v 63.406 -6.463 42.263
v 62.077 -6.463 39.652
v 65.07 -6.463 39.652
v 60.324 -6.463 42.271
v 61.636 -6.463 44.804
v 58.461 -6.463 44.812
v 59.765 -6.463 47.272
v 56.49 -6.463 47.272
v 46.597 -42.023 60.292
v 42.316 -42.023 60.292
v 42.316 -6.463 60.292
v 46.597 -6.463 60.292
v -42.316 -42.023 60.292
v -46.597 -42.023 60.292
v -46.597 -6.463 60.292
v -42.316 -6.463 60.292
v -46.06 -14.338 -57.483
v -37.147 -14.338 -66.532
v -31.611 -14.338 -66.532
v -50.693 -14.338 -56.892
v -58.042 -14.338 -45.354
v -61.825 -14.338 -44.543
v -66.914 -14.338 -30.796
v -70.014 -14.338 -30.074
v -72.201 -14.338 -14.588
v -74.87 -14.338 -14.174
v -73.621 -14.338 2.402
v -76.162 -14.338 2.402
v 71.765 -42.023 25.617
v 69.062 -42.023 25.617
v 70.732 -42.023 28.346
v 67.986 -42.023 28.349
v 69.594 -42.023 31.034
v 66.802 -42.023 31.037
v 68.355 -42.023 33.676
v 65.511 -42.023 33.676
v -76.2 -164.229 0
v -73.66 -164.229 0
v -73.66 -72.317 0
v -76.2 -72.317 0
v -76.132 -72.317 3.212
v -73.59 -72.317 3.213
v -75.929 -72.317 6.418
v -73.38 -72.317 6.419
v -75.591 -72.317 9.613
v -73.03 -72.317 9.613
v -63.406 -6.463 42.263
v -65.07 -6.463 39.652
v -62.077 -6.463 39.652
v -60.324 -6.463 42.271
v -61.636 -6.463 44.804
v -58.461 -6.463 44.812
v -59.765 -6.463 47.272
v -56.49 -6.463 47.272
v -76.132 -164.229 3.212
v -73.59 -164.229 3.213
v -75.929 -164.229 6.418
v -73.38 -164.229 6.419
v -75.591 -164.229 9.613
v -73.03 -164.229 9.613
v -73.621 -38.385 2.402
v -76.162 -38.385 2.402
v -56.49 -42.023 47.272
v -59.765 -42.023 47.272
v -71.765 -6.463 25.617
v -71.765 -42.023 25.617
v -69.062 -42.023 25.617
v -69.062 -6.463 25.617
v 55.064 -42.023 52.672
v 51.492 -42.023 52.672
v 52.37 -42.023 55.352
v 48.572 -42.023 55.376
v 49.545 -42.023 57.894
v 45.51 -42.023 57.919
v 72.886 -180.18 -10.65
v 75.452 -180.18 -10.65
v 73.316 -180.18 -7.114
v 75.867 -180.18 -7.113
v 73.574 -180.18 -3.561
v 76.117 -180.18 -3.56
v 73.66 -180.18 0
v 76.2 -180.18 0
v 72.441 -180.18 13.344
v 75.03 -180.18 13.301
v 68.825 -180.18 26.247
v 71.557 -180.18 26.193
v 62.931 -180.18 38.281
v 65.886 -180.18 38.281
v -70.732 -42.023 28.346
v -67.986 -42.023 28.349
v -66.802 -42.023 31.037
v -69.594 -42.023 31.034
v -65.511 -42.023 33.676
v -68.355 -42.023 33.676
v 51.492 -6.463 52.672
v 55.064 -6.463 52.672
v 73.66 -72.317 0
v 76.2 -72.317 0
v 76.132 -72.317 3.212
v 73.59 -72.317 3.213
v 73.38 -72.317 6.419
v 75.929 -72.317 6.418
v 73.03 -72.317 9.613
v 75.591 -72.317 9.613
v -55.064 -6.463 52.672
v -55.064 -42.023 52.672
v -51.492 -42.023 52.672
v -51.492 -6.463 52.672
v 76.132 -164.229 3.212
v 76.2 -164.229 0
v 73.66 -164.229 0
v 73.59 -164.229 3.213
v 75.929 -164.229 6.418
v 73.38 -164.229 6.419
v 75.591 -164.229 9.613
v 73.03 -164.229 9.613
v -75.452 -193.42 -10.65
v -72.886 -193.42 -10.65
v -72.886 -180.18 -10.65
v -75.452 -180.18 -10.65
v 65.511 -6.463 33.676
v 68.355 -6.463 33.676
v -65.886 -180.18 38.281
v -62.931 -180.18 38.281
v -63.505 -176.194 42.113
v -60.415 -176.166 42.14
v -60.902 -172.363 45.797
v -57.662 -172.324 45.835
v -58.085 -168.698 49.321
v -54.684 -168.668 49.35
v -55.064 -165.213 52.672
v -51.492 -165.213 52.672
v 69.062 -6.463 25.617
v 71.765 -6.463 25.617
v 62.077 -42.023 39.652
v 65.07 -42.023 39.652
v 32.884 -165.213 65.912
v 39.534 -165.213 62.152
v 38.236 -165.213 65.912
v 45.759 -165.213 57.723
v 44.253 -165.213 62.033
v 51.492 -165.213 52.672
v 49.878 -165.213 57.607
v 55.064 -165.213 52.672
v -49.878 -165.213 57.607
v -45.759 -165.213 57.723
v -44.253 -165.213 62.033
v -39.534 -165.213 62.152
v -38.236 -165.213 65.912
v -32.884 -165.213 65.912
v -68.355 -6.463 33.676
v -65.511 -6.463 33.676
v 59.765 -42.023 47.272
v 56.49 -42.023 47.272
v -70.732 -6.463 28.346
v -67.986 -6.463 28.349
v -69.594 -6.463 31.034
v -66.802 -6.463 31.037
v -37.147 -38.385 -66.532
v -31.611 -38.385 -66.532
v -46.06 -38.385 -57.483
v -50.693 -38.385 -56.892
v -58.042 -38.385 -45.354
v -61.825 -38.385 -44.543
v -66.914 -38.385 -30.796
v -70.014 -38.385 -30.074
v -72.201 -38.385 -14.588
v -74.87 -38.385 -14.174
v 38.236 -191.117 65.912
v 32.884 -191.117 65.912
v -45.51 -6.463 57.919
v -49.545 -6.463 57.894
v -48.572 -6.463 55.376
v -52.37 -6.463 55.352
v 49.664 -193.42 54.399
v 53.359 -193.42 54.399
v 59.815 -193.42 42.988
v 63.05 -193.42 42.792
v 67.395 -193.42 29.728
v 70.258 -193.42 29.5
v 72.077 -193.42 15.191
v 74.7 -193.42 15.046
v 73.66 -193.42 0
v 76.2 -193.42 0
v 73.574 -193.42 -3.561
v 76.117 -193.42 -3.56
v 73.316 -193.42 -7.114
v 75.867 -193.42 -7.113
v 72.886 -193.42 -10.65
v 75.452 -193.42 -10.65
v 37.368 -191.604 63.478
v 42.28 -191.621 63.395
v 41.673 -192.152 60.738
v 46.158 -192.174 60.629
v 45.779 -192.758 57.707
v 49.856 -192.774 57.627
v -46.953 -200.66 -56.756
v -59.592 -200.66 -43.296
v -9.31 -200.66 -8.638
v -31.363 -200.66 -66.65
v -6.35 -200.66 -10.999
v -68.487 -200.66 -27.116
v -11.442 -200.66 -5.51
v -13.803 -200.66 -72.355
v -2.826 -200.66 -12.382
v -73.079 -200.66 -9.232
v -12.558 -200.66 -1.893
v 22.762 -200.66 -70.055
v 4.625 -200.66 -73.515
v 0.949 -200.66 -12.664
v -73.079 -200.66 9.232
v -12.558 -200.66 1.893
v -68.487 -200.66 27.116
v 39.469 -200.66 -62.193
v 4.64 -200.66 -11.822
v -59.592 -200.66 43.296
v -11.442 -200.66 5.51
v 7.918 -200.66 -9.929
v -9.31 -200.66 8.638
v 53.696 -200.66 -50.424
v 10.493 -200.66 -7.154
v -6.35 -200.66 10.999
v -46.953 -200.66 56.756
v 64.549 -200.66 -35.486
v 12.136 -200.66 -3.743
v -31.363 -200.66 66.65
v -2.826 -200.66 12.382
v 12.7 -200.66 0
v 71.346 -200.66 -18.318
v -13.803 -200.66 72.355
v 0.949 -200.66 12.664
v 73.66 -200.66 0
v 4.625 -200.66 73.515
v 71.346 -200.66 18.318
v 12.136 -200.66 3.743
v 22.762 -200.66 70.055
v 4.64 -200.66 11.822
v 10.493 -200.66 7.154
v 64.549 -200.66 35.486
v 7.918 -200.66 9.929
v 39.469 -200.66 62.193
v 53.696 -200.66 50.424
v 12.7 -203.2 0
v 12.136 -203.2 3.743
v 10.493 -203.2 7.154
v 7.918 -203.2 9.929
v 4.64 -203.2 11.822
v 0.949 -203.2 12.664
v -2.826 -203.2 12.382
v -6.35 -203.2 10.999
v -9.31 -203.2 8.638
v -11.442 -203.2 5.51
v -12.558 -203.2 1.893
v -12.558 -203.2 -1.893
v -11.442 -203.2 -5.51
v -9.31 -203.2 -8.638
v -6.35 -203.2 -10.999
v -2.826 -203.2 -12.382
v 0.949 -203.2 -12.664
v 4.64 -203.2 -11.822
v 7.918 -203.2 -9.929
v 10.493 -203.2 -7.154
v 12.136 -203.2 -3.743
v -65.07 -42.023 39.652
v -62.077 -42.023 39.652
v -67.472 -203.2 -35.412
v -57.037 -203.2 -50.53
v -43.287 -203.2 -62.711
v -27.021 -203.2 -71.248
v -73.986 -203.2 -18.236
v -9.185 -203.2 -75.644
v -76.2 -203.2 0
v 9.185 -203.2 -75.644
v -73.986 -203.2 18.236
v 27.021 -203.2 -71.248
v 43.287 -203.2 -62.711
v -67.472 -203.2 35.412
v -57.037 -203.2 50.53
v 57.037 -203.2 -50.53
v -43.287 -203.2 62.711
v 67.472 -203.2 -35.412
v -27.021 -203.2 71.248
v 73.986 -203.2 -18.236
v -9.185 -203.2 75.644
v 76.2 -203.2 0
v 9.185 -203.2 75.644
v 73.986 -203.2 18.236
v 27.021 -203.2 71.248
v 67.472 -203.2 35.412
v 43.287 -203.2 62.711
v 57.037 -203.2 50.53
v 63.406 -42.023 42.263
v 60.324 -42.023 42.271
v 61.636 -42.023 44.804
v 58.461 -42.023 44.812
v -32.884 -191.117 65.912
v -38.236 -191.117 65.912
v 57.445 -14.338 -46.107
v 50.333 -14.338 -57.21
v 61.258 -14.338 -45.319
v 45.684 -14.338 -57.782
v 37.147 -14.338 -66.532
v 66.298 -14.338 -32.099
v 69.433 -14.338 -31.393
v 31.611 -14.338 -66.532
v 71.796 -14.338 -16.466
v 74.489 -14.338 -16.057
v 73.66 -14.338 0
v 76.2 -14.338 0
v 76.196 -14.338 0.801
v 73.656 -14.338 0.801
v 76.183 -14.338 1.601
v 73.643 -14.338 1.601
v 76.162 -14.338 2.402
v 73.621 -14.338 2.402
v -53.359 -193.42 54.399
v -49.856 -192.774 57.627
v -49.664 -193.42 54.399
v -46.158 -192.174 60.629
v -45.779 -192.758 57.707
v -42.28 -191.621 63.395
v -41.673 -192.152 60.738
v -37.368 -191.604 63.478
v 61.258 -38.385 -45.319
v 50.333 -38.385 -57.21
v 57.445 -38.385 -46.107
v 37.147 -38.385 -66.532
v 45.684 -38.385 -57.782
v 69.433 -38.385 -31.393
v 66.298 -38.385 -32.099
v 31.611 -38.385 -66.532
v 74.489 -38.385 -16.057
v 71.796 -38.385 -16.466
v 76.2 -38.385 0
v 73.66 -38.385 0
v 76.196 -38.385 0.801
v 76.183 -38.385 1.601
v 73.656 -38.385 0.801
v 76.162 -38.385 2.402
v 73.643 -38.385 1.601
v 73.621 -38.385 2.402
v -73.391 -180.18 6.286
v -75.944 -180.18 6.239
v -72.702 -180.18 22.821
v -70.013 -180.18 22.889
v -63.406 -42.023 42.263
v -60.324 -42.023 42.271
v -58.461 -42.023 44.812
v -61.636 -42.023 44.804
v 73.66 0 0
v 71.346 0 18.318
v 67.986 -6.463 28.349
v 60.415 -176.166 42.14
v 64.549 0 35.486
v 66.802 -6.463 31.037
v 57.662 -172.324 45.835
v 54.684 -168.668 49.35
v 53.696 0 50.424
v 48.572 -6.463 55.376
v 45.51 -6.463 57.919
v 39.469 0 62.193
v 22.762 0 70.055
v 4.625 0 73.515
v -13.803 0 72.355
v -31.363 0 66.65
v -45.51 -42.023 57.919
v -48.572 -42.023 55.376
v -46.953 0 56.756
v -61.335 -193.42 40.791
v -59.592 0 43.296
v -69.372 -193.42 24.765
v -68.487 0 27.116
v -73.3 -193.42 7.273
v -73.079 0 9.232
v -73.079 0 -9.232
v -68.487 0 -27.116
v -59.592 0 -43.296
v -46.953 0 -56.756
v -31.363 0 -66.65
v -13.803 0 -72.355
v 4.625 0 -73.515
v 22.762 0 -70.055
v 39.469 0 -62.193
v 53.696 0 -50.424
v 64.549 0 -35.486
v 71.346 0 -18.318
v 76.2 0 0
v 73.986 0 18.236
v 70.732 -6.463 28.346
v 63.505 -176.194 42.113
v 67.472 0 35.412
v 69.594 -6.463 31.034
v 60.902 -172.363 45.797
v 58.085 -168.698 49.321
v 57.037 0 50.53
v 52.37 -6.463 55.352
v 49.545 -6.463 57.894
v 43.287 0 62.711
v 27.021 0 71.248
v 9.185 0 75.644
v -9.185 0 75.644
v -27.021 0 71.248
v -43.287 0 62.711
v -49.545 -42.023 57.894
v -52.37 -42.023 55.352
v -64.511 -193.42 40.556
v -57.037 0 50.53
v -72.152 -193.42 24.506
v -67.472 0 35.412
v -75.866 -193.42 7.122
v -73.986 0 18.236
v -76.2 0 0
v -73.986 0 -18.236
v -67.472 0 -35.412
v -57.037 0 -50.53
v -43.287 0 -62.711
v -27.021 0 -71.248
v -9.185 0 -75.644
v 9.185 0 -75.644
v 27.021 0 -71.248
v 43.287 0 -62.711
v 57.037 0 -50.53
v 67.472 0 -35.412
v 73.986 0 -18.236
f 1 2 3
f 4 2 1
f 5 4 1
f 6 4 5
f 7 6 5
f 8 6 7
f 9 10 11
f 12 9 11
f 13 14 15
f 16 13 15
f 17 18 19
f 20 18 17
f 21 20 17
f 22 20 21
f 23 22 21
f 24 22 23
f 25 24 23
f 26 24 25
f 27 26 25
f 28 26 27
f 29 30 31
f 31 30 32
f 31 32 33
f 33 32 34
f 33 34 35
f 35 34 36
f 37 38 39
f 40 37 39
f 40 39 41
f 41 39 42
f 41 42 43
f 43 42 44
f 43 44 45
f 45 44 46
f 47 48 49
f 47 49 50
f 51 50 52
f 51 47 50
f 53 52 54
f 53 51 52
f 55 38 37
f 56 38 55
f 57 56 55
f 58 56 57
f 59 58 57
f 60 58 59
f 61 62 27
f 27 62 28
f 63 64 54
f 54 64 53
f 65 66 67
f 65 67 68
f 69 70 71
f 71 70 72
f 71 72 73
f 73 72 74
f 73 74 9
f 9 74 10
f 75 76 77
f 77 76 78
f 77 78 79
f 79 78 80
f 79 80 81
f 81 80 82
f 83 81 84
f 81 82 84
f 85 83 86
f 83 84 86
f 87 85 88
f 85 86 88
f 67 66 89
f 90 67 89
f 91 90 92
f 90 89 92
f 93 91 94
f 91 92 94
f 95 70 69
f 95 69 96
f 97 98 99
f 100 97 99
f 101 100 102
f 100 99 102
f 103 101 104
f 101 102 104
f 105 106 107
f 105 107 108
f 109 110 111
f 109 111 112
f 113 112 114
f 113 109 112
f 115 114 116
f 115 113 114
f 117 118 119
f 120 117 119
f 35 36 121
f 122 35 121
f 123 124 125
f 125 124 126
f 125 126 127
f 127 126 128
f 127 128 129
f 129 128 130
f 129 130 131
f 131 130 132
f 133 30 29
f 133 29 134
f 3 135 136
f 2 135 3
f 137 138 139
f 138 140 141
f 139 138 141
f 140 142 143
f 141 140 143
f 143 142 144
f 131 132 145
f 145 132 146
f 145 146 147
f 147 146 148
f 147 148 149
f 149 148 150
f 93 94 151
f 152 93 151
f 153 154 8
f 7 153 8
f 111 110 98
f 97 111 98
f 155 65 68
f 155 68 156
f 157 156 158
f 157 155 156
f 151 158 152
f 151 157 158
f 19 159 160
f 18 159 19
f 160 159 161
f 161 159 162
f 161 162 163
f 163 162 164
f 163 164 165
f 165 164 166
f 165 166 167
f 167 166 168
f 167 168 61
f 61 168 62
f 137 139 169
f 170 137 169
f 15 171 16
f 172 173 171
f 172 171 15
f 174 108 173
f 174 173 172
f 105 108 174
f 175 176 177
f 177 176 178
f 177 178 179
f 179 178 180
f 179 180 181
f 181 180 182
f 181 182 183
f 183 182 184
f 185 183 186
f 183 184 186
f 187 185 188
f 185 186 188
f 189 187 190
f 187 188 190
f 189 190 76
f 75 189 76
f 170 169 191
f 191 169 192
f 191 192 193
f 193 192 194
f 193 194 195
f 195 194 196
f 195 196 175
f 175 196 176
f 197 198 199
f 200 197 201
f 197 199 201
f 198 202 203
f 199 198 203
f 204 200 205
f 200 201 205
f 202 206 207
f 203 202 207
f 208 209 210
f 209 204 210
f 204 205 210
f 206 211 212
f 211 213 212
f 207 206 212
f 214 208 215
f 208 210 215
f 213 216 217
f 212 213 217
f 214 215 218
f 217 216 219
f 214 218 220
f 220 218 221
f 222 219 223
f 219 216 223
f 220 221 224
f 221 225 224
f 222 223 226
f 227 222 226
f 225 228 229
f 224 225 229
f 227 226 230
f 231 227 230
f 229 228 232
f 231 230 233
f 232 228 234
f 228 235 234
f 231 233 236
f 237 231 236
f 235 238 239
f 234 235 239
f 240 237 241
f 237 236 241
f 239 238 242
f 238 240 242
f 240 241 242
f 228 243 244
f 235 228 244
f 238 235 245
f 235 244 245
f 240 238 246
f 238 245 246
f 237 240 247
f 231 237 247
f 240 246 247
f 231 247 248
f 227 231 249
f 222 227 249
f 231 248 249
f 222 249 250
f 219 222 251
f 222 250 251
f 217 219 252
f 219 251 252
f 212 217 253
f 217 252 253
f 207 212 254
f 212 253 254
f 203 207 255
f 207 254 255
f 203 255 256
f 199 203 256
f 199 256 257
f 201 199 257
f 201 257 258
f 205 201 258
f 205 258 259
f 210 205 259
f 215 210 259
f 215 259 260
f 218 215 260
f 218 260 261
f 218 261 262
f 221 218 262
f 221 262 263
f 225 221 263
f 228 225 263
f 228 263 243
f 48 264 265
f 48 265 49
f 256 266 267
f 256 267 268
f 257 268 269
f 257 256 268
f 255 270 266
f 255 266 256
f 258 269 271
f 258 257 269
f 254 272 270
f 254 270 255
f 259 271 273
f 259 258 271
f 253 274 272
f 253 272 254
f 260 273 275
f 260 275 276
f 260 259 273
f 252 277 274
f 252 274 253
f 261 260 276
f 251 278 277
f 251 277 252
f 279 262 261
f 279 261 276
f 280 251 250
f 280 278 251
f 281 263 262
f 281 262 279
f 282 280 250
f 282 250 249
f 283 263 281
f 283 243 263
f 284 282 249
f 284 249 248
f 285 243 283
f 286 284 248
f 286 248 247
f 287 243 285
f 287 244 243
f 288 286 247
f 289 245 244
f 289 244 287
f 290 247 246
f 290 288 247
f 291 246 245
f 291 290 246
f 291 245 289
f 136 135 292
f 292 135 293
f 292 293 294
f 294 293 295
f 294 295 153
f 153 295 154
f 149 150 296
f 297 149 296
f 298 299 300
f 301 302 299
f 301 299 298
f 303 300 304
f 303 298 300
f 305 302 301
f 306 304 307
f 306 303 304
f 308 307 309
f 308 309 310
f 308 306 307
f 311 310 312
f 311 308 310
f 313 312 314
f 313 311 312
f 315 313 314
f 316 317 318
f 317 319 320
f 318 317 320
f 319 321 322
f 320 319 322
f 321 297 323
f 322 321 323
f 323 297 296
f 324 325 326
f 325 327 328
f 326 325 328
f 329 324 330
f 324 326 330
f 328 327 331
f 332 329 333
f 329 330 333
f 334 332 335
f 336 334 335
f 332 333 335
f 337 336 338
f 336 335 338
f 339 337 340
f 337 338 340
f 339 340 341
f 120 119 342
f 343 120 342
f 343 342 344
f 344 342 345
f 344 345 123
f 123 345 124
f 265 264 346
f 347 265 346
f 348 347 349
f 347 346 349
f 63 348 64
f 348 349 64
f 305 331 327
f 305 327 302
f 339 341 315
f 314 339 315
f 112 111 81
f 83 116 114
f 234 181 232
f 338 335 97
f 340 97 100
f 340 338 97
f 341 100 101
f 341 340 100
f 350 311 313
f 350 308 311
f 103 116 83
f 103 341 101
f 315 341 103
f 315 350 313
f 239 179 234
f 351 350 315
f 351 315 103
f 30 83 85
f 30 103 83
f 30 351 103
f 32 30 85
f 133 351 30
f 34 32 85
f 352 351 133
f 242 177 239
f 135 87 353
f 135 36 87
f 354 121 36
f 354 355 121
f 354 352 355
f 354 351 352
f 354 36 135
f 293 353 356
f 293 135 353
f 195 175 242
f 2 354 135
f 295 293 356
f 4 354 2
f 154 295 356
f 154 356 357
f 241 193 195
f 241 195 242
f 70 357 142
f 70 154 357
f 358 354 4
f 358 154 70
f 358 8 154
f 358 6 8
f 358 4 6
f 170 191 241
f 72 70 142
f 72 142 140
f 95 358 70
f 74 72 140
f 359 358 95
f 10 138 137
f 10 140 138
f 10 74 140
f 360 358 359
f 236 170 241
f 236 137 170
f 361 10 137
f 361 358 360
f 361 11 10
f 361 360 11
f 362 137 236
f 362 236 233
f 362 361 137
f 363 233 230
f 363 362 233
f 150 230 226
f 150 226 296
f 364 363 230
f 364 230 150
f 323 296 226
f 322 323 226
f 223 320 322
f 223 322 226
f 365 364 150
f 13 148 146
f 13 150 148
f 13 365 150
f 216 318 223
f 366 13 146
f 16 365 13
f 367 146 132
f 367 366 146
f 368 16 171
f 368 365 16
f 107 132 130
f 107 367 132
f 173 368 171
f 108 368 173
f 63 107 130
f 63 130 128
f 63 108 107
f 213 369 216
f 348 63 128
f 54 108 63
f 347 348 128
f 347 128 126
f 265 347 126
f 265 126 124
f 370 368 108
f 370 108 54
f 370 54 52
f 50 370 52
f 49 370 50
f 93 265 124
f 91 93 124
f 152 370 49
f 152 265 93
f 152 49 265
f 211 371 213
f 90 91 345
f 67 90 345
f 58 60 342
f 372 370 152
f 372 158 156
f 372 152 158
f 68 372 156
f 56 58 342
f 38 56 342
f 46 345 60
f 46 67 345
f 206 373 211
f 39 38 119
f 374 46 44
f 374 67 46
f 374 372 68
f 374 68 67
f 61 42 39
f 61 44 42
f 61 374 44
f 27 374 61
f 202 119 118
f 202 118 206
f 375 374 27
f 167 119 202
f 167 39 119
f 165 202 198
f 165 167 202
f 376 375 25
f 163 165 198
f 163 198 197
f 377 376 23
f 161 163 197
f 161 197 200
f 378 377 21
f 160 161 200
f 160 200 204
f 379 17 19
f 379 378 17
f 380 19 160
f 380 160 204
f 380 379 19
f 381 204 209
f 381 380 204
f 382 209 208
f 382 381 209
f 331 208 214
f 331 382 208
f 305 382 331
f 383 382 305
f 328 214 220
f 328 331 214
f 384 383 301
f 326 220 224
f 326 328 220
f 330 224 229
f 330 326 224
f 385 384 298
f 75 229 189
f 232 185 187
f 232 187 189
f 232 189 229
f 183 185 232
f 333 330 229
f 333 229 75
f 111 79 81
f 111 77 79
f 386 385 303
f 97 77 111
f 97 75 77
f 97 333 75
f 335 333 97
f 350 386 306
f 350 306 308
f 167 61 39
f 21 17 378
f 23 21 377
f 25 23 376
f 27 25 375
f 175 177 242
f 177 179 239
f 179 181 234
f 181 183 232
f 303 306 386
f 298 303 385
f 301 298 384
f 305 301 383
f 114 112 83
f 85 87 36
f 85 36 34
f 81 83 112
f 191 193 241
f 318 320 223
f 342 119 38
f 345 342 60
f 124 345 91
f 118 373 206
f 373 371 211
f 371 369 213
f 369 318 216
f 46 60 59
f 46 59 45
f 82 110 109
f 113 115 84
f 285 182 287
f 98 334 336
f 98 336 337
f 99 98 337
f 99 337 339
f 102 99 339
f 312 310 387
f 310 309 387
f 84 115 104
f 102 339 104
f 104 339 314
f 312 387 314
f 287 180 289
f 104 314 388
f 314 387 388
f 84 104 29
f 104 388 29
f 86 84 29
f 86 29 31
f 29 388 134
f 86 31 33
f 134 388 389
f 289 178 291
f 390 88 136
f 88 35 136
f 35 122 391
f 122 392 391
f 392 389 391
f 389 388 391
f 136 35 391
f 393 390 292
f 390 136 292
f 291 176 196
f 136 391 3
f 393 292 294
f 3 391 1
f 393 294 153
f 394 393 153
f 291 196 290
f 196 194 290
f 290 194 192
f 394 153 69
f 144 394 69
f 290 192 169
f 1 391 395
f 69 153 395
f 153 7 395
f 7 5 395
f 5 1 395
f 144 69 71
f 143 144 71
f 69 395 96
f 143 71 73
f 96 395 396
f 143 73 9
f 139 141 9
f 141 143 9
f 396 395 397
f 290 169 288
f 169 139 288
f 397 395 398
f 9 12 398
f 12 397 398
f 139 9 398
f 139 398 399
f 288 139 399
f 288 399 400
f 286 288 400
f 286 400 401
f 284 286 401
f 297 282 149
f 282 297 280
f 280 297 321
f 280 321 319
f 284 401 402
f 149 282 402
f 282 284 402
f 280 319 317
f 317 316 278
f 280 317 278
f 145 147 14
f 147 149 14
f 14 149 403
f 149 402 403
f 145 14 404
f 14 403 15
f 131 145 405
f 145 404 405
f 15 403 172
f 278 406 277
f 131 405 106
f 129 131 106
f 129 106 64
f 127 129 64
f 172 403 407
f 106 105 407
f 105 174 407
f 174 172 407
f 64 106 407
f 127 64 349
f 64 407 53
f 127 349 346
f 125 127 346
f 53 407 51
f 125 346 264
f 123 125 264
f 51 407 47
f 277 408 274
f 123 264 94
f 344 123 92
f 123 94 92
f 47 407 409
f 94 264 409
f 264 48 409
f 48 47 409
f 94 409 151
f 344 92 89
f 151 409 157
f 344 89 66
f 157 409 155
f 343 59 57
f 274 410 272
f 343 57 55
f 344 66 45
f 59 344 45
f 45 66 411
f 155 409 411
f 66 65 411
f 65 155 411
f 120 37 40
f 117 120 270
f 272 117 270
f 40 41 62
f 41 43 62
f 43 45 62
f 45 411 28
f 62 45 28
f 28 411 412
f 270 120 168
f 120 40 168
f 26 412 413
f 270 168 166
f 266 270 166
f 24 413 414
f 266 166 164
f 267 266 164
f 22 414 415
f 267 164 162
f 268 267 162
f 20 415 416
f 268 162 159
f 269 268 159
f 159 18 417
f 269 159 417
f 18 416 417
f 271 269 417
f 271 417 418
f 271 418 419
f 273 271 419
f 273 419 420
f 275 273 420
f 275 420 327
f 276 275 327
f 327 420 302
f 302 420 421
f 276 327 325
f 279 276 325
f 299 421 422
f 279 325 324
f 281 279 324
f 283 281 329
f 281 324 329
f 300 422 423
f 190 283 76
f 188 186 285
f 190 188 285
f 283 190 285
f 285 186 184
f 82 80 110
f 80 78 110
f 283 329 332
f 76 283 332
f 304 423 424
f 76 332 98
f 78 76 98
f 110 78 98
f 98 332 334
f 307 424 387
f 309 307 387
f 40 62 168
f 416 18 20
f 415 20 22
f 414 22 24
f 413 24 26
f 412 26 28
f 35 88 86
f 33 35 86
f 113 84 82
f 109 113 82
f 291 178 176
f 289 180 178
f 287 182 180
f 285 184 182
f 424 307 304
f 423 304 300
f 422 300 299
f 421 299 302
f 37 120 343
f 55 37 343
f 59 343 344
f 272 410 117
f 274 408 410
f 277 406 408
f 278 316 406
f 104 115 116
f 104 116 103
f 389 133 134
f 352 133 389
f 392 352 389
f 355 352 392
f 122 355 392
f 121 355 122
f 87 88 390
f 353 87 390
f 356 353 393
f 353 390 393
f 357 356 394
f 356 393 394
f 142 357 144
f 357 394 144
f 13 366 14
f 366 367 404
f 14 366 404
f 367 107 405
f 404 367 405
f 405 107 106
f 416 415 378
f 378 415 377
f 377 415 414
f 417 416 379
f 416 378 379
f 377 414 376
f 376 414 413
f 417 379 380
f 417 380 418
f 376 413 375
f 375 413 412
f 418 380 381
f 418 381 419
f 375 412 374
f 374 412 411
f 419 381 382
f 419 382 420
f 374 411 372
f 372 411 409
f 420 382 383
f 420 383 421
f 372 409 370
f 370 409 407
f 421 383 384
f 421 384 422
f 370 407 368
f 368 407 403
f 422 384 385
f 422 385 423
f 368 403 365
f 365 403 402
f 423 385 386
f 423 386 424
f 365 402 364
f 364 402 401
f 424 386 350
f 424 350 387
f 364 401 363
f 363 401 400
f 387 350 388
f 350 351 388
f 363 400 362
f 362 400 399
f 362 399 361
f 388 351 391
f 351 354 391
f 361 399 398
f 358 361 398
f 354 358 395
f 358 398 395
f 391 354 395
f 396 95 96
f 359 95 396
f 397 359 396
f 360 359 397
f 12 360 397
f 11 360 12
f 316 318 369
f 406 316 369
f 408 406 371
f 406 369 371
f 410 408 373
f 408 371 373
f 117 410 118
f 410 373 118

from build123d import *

# Parameters (mm, degrees)
F0_R      = 76.2
F1_DEPTH  = 203.2
F2_R      = 12.7
F3_DEPTH  = 38.1
F4_T      = -2.54
F5_W      = 35.56
F5_H      = 7.62
F5_H_2    = 8.0591589212
F6_DEPTH  = 88.9
F7_R      = 12.7
F8_DEPTH  = 241.301
F9_W      = 24.0467190742
F9_H      = 68.9339339733
F9_W_2    = 91.9119119644
F9_H_2    = 9.6131237224
F10_DEPTH = 127


with BuildPart() as f1:
    # F0 (on Front) → F1 (new body)
    with BuildSketch(Plane.XZ):
        Circle(F0_R)
    extrude(amount=F1_DEPTH)

    # F2 (on face) → F3 (join)
    with BuildSketch(Plane.XZ.offset(203.2)):
        Circle(F2_R)
    extrude(amount=F3_DEPTH)

    # F4
    f4_openings = [f1.faces().sort_by_distance(p)[0] for p in [
        (0, 0, 0),
    ]]
    offset(amount=F4_T, openings=f4_openings, kind=Kind.INTERSECTION)

    # F5 (on Right) → F6 (cut, symmetric)
    with BuildSketch(Plane.YZ):
        with Locations((-24.2427656141, 56.4823563671)):
            Rectangle(F5_W, F5_H)
        with Locations((-24.2427656141, 43.4618890285)):
            Rectangle(F5_W, F5_H)
        with Locations((-24.2427656141, 29.6461898834)):
            Rectangle(F5_W, F5_H_2)
        Polygon((-165.2127504349, 65.9124031663), (-191.117182374, 65.9124031663), (-193.4197992086, 54.3993189931), (-193.4197992086, -10.6496037915), (-180.17975986, -10.6496037915), (-180.17975986, 38.2810048759), (-165.2127504349, 52.6723563671), align=None)
    extrude(amount=F6_DEPTH, both=True, mode=Mode.SUBTRACT)

    # F7 (on face) → F8 (cut, through all)
    with BuildSketch(Plane.XZ.offset(241.3)):
        Circle(F7_R)
    extrude(amount=-F8_DEPTH, mode=Mode.SUBTRACT)

    # F9 (on Right) → F10 (cut, symmetric)
    with BuildSketch(Plane.YZ):
        with Locations((-26.3611767441, -32.0650786161)):
            Rectangle(F9_W, F9_H)
        with Locations((-118.2730868459, 4.8065618612)):
            Rectangle(F9_W_2, F9_H_2)
    extrude(amount=F10_DEPTH, both=True, mode=Mode.SUBTRACT)


solid = f1.part
